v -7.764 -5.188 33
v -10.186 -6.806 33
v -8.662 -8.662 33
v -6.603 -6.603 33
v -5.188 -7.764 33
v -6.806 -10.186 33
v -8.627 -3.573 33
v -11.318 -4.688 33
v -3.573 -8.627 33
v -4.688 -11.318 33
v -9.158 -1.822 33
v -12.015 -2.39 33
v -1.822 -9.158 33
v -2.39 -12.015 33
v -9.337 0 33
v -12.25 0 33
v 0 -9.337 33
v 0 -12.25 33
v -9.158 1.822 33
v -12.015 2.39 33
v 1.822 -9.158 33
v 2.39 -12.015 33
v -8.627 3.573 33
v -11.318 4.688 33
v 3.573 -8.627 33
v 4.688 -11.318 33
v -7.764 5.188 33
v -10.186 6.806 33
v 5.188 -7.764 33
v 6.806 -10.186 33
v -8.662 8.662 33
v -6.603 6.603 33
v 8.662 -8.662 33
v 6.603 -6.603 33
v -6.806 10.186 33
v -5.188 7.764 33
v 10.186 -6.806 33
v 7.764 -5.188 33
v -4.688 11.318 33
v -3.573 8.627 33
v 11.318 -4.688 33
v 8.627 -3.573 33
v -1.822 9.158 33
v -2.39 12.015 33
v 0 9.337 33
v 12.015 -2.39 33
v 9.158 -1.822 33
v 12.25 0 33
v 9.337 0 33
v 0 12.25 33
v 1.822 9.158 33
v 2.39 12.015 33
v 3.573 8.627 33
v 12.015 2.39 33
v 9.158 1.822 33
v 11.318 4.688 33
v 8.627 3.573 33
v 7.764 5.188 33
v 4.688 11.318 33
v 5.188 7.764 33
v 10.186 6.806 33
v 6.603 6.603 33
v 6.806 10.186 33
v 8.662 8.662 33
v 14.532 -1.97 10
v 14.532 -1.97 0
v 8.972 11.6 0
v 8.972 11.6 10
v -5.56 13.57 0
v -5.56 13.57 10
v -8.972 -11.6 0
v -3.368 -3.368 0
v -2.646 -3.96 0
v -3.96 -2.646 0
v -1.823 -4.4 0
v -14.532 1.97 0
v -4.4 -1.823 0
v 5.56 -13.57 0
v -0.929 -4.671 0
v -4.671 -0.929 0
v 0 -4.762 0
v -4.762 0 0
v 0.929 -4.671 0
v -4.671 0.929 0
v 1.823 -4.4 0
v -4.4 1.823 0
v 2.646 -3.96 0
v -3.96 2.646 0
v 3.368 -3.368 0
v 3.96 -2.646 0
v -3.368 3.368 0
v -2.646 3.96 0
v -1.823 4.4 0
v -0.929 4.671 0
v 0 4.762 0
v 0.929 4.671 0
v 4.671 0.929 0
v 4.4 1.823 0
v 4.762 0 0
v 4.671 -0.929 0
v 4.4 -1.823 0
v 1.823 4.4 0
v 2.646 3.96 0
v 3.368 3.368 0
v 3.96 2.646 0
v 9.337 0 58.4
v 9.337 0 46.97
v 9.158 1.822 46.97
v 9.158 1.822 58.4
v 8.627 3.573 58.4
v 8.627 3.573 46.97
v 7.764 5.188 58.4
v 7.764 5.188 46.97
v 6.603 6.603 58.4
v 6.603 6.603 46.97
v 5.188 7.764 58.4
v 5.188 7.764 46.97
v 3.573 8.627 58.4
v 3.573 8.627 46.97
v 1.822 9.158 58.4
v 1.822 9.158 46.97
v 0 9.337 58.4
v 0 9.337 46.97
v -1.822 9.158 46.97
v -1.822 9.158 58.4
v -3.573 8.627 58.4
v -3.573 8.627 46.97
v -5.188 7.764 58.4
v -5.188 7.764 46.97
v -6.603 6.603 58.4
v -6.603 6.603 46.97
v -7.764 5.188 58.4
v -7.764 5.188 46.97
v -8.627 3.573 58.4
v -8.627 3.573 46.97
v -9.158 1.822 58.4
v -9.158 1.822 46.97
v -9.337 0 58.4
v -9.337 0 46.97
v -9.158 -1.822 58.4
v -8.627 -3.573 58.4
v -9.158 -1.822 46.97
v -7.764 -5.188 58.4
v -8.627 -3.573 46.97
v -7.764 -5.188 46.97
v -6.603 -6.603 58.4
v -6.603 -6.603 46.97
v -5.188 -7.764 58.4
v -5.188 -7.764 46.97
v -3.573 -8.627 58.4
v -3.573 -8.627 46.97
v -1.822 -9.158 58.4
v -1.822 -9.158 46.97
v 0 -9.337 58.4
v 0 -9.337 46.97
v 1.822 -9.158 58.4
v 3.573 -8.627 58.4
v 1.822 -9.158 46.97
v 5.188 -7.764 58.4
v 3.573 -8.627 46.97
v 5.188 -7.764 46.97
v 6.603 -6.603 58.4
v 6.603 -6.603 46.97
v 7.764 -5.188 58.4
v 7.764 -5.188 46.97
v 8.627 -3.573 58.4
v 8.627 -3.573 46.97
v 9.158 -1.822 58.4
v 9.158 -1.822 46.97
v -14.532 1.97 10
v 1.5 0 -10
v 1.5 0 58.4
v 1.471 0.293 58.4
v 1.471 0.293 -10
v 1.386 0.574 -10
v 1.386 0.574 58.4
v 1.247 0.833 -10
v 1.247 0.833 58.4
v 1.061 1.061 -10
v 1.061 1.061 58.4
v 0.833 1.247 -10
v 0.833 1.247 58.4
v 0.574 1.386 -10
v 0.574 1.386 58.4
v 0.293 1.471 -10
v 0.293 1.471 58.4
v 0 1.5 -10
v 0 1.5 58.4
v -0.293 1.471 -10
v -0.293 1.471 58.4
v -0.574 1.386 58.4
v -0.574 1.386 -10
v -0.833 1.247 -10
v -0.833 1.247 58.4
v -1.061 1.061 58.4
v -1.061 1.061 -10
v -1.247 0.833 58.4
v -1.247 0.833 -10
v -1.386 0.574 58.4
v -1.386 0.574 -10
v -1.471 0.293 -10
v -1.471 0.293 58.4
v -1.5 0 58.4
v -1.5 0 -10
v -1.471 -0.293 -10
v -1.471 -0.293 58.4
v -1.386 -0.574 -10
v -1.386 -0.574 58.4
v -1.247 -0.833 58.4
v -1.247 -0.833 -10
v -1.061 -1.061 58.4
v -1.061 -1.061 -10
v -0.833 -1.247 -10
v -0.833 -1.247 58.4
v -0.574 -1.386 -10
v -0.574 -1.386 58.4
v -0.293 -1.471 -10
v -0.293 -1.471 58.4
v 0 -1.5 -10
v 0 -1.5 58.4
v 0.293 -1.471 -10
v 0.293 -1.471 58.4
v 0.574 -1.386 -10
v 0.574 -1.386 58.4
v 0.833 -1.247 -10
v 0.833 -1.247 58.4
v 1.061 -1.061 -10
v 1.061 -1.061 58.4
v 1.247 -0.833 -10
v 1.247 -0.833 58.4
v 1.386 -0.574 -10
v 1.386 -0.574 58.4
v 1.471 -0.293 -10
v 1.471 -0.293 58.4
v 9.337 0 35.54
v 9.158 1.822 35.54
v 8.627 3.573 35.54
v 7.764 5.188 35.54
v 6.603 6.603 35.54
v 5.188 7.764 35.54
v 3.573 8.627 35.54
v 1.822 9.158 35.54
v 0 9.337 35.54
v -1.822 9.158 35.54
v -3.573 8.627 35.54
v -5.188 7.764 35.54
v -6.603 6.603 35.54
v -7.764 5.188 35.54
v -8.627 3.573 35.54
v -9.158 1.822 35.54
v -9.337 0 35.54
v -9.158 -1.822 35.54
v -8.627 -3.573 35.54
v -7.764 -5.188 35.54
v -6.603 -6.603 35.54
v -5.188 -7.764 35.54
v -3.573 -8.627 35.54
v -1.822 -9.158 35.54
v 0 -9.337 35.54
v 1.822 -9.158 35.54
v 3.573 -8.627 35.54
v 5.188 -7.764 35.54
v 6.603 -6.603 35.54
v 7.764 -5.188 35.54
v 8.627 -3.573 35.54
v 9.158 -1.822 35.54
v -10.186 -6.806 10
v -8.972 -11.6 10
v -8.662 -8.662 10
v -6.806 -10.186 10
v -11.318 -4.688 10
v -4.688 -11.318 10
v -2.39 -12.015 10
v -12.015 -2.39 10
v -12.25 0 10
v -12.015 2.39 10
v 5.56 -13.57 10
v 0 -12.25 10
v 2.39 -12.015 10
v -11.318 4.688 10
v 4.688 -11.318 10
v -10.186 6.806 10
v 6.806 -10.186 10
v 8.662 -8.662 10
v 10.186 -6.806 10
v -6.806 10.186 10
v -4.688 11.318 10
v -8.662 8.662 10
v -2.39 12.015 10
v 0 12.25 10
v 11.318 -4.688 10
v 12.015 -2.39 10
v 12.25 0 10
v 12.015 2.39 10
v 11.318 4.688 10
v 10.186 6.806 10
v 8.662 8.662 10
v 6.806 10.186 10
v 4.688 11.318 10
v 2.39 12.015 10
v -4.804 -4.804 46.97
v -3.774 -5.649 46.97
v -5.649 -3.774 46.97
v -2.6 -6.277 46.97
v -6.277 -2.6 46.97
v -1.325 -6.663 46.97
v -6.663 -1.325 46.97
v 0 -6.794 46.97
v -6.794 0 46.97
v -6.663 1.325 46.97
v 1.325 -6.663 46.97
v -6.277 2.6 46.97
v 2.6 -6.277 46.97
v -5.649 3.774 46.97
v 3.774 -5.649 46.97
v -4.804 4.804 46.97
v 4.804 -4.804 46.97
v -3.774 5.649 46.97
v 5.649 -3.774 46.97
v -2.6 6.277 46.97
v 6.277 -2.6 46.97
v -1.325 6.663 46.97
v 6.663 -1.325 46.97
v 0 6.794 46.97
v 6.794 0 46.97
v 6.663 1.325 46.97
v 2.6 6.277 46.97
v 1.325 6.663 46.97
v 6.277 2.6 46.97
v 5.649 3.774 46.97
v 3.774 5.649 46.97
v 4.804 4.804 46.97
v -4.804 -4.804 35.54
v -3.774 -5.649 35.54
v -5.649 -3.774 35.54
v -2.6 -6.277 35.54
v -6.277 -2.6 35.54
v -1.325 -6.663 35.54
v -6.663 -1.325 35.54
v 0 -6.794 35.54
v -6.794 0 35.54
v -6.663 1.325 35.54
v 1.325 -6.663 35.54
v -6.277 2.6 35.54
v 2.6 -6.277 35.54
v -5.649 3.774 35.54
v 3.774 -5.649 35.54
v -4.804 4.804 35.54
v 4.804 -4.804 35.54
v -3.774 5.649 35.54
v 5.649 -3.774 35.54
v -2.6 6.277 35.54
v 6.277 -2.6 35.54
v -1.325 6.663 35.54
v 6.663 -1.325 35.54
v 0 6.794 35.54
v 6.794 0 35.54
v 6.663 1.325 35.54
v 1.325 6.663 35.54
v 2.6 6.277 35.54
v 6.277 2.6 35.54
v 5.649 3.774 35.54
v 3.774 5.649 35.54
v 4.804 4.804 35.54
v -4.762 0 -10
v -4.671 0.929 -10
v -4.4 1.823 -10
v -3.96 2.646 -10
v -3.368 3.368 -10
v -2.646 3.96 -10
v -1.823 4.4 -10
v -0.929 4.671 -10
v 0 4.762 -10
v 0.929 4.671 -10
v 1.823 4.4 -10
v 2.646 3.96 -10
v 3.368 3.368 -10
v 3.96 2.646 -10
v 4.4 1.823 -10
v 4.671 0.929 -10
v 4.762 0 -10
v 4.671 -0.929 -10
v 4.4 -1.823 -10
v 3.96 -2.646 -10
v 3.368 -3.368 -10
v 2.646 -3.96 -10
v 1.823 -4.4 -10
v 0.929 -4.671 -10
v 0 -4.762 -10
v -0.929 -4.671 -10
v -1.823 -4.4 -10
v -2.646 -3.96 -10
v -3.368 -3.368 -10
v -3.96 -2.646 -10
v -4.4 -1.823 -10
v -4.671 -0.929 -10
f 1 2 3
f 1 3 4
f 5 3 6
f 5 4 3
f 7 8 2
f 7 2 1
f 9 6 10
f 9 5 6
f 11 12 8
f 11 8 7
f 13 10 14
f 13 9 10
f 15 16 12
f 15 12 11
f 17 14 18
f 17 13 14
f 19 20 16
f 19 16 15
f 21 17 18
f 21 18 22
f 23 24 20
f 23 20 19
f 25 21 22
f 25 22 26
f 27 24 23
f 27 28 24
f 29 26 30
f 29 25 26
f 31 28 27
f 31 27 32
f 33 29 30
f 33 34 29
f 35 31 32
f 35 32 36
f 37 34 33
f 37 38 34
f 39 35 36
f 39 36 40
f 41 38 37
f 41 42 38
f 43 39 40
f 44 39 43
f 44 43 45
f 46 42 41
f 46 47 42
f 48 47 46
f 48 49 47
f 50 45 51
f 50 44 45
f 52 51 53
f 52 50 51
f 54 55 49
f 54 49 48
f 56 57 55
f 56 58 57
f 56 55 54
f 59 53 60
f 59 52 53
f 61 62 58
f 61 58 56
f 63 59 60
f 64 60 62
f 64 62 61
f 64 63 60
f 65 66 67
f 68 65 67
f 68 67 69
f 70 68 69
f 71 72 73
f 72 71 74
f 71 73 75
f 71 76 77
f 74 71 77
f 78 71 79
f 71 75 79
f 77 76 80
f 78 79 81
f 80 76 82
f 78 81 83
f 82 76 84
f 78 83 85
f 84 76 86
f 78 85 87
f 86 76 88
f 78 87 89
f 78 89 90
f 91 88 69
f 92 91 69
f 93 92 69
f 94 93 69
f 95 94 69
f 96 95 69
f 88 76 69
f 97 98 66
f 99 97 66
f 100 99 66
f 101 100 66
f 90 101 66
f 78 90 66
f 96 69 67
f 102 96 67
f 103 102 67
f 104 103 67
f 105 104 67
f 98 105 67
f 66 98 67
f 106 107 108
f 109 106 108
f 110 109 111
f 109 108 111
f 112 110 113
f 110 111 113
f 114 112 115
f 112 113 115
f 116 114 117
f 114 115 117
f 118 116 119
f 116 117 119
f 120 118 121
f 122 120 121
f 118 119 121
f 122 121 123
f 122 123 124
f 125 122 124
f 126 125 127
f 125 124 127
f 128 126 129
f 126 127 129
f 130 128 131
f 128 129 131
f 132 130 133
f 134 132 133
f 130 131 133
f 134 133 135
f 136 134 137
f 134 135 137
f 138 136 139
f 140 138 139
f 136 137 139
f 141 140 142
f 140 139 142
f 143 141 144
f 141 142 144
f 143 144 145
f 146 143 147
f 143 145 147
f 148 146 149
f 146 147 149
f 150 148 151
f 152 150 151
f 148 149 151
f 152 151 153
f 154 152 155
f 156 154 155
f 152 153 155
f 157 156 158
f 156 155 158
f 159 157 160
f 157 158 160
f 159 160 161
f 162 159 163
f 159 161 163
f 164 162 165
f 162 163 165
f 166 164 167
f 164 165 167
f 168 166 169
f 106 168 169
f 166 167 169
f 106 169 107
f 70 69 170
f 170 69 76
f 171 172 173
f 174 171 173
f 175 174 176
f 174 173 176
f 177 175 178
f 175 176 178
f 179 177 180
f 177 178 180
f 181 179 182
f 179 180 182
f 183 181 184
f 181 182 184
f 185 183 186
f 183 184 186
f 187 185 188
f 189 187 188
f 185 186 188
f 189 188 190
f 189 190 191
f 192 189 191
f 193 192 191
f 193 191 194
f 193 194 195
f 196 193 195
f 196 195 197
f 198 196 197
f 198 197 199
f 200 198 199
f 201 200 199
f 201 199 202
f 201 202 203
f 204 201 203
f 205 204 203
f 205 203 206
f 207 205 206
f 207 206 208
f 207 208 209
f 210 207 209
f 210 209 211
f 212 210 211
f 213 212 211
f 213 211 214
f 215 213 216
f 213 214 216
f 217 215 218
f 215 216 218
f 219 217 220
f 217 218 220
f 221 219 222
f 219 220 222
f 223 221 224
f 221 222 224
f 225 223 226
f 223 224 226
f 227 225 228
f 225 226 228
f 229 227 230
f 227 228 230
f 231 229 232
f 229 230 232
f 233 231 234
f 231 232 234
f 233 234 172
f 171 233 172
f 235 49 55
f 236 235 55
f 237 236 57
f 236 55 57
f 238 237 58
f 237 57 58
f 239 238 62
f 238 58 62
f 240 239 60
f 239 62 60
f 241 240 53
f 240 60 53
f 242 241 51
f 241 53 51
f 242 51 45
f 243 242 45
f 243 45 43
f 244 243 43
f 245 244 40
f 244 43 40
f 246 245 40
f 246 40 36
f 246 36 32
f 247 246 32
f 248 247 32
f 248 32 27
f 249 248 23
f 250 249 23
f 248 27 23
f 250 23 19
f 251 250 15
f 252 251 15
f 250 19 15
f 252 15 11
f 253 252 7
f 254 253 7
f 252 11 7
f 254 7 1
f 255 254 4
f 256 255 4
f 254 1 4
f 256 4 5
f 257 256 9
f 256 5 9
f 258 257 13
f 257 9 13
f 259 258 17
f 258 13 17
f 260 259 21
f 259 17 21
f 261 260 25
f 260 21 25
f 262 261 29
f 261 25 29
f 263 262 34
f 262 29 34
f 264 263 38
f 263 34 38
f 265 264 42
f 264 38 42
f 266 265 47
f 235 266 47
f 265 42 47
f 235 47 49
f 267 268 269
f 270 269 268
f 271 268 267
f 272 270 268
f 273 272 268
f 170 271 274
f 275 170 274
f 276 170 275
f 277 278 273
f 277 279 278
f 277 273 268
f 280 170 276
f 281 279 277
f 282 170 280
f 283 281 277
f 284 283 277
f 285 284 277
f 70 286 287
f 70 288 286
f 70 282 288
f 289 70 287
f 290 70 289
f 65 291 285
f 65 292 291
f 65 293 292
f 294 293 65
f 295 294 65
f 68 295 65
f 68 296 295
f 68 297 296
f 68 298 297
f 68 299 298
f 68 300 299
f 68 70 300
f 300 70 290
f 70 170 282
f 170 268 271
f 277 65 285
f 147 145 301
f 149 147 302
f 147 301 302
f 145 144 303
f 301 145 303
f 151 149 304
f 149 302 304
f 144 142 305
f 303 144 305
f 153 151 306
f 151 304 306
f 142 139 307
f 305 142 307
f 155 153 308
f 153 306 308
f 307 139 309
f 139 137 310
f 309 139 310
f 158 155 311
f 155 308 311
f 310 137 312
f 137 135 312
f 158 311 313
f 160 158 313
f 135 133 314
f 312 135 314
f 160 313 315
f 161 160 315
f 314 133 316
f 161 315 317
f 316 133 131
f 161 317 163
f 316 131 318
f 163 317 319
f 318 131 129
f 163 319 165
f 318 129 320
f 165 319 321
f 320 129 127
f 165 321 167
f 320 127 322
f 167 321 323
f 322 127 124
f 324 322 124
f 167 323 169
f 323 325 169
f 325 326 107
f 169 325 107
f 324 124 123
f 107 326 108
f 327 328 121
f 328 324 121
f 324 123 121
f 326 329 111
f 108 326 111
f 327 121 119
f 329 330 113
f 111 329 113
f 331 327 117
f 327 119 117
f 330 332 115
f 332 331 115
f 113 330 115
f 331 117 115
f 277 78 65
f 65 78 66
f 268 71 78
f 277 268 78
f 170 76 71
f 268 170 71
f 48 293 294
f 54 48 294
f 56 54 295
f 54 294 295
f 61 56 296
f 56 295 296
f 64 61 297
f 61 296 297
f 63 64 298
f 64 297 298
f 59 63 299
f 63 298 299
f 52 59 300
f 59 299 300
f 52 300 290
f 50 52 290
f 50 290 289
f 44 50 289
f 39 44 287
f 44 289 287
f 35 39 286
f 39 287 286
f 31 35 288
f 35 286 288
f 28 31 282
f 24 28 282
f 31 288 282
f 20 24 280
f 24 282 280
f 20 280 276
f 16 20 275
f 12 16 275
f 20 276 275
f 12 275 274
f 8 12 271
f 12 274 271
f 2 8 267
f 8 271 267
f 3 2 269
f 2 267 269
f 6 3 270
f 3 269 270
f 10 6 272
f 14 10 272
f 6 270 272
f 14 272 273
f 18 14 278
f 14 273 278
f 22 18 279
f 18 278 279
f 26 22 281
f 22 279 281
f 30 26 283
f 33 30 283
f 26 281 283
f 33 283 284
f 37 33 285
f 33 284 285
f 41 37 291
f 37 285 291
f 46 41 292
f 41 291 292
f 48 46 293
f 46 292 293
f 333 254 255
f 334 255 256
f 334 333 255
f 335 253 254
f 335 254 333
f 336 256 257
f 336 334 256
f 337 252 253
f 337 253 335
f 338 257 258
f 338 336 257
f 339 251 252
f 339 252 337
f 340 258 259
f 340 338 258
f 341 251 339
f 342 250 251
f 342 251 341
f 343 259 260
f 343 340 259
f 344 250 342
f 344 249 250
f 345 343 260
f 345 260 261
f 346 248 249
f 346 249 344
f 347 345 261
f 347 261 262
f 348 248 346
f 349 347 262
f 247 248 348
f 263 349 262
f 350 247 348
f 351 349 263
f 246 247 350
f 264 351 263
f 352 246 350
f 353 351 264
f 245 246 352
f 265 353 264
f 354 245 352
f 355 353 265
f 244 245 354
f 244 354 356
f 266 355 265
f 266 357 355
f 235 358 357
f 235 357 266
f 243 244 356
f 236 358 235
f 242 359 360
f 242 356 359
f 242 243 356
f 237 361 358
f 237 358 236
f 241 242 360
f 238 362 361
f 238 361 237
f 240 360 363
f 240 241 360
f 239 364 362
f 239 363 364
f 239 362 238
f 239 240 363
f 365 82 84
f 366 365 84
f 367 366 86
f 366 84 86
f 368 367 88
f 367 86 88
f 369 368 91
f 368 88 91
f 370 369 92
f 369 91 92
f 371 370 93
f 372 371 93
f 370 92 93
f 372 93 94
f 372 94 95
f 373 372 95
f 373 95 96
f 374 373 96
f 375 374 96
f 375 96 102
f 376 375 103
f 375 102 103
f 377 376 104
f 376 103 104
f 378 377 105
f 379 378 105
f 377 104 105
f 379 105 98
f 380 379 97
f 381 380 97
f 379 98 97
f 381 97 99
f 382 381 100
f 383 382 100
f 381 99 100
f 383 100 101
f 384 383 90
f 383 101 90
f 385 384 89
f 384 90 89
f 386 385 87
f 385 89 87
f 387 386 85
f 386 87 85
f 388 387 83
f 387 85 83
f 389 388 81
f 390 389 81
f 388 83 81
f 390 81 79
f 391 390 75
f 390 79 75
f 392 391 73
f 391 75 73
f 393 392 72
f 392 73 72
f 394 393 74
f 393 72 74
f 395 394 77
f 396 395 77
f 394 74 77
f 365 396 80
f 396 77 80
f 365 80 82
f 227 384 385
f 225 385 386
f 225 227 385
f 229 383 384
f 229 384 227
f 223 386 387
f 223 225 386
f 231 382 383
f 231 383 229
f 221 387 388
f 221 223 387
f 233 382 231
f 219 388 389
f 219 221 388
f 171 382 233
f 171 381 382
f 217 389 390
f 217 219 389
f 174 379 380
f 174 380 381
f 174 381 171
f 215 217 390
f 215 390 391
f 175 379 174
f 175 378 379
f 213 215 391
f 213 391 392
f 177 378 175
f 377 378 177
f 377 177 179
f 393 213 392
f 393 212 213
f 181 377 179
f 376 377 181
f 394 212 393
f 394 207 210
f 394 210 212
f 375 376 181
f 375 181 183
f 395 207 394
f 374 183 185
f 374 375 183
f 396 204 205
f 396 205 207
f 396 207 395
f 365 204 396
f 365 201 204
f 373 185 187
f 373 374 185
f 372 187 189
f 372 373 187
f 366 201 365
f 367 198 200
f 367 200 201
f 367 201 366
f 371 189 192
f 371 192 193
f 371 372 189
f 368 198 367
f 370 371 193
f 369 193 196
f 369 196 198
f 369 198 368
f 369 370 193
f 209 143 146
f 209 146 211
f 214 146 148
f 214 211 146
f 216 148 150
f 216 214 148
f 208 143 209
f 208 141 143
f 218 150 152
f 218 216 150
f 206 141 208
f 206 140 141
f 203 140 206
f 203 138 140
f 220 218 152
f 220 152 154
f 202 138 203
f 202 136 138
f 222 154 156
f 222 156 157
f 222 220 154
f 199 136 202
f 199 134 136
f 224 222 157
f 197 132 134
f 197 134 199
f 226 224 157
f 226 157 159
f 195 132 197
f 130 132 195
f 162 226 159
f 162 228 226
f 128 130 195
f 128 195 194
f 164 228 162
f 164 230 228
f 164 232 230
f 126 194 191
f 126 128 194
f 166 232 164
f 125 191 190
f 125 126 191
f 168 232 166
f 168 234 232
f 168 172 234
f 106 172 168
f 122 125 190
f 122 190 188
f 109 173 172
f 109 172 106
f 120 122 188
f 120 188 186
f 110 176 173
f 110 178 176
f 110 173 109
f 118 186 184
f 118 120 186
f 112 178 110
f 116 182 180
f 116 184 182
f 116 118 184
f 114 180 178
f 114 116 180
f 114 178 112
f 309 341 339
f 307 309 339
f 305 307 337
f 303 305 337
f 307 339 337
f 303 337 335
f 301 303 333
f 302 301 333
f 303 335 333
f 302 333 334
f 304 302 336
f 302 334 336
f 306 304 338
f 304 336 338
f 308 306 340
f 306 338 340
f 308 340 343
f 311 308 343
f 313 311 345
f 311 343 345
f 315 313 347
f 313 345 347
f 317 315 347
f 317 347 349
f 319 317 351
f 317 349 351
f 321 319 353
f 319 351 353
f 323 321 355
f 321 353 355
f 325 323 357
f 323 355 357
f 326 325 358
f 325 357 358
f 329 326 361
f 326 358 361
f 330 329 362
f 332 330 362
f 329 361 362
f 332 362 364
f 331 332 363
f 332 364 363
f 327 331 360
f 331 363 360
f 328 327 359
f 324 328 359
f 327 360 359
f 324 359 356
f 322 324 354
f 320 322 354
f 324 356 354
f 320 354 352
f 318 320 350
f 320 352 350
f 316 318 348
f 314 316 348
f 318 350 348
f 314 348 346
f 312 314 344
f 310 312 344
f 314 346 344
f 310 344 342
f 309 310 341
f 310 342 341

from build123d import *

# Parameters (mm, degrees)
BOSS_EXTRUDE1_DEPTH = 10
SKETCH2_R           = 12.25
BOSS_EXTRUDE2_DEPTH = 23
SKETCH5_R           = 4.7625
BOSS_EXTRUDE3_DEPTH = 10
SKETCH6_R           = 9.337490473
BOSS_EXTRUDE4_DEPTH = 2.54
SKETCH7_R           = 6.793718317
BOSS_EXTRUDE5_DEPTH = 11.43
SKETCH8_R           = 9.337490473
BOSS_EXTRUDE6_DEPTH = 11.43
SKETCH9_R           = 1.5
CUT_EXTRUDE1_DEPTH  = 72.231117539


with BuildPart() as part:
    # Sketch1 → Boss-Extrude1 (new body)
    with BuildSketch(Plane.XY):
        Polygon((14.531817418, -1.969674048), (8.971696472, 11.600086024), (-5.560120947, 13.569760071), (-14.531817418, 1.969674048), (-8.971696472, -11.600086024), (5.560120947, -13.569760071), align=None)
    extrude(amount=BOSS_EXTRUDE1_DEPTH)

    # Sketch2 → Boss-Extrude2 (add)
    with BuildSketch(Plane.XY.offset(10)):
        Circle(SKETCH2_R)
    extrude(amount=BOSS_EXTRUDE2_DEPTH)

    # Sketch5 → Boss-Extrude3 (add)
    with BuildSketch(Plane(origin=(0, 0, 0), x_dir=(-1, 0, 0), z_dir=(0, 0, -1))):
        Circle(SKETCH5_R)
    extrude(amount=BOSS_EXTRUDE3_DEPTH)

    # Sketch6 → Boss-Extrude4 (add)
    with BuildSketch(Plane.XY.offset(33)):
        Circle(SKETCH6_R)
    extrude(amount=BOSS_EXTRUDE4_DEPTH)

    # Sketch7 → Boss-Extrude5 (add)
    with BuildSketch(Plane.XY.offset(35.54)):
        with Locations(Location((0, 0, 0), (0, 0, 180))):
            Circle(SKETCH7_R)
    extrude(amount=BOSS_EXTRUDE5_DEPTH)

    # Sketch8 → Boss-Extrude6 (add)
    with BuildSketch(Plane.XY.offset(46.97)):
        Circle(SKETCH8_R)
    extrude(amount=BOSS_EXTRUDE6_DEPTH)

    # Sketch9 → Cut-Extrude1 (cut, through all)
    with BuildSketch(Plane.XY.offset(58.4)):
        Circle(SKETCH9_R)
    extrude(amount=-CUT_EXTRUDE1_DEPTH, mode=Mode.SUBTRACT)


solid = part.part
